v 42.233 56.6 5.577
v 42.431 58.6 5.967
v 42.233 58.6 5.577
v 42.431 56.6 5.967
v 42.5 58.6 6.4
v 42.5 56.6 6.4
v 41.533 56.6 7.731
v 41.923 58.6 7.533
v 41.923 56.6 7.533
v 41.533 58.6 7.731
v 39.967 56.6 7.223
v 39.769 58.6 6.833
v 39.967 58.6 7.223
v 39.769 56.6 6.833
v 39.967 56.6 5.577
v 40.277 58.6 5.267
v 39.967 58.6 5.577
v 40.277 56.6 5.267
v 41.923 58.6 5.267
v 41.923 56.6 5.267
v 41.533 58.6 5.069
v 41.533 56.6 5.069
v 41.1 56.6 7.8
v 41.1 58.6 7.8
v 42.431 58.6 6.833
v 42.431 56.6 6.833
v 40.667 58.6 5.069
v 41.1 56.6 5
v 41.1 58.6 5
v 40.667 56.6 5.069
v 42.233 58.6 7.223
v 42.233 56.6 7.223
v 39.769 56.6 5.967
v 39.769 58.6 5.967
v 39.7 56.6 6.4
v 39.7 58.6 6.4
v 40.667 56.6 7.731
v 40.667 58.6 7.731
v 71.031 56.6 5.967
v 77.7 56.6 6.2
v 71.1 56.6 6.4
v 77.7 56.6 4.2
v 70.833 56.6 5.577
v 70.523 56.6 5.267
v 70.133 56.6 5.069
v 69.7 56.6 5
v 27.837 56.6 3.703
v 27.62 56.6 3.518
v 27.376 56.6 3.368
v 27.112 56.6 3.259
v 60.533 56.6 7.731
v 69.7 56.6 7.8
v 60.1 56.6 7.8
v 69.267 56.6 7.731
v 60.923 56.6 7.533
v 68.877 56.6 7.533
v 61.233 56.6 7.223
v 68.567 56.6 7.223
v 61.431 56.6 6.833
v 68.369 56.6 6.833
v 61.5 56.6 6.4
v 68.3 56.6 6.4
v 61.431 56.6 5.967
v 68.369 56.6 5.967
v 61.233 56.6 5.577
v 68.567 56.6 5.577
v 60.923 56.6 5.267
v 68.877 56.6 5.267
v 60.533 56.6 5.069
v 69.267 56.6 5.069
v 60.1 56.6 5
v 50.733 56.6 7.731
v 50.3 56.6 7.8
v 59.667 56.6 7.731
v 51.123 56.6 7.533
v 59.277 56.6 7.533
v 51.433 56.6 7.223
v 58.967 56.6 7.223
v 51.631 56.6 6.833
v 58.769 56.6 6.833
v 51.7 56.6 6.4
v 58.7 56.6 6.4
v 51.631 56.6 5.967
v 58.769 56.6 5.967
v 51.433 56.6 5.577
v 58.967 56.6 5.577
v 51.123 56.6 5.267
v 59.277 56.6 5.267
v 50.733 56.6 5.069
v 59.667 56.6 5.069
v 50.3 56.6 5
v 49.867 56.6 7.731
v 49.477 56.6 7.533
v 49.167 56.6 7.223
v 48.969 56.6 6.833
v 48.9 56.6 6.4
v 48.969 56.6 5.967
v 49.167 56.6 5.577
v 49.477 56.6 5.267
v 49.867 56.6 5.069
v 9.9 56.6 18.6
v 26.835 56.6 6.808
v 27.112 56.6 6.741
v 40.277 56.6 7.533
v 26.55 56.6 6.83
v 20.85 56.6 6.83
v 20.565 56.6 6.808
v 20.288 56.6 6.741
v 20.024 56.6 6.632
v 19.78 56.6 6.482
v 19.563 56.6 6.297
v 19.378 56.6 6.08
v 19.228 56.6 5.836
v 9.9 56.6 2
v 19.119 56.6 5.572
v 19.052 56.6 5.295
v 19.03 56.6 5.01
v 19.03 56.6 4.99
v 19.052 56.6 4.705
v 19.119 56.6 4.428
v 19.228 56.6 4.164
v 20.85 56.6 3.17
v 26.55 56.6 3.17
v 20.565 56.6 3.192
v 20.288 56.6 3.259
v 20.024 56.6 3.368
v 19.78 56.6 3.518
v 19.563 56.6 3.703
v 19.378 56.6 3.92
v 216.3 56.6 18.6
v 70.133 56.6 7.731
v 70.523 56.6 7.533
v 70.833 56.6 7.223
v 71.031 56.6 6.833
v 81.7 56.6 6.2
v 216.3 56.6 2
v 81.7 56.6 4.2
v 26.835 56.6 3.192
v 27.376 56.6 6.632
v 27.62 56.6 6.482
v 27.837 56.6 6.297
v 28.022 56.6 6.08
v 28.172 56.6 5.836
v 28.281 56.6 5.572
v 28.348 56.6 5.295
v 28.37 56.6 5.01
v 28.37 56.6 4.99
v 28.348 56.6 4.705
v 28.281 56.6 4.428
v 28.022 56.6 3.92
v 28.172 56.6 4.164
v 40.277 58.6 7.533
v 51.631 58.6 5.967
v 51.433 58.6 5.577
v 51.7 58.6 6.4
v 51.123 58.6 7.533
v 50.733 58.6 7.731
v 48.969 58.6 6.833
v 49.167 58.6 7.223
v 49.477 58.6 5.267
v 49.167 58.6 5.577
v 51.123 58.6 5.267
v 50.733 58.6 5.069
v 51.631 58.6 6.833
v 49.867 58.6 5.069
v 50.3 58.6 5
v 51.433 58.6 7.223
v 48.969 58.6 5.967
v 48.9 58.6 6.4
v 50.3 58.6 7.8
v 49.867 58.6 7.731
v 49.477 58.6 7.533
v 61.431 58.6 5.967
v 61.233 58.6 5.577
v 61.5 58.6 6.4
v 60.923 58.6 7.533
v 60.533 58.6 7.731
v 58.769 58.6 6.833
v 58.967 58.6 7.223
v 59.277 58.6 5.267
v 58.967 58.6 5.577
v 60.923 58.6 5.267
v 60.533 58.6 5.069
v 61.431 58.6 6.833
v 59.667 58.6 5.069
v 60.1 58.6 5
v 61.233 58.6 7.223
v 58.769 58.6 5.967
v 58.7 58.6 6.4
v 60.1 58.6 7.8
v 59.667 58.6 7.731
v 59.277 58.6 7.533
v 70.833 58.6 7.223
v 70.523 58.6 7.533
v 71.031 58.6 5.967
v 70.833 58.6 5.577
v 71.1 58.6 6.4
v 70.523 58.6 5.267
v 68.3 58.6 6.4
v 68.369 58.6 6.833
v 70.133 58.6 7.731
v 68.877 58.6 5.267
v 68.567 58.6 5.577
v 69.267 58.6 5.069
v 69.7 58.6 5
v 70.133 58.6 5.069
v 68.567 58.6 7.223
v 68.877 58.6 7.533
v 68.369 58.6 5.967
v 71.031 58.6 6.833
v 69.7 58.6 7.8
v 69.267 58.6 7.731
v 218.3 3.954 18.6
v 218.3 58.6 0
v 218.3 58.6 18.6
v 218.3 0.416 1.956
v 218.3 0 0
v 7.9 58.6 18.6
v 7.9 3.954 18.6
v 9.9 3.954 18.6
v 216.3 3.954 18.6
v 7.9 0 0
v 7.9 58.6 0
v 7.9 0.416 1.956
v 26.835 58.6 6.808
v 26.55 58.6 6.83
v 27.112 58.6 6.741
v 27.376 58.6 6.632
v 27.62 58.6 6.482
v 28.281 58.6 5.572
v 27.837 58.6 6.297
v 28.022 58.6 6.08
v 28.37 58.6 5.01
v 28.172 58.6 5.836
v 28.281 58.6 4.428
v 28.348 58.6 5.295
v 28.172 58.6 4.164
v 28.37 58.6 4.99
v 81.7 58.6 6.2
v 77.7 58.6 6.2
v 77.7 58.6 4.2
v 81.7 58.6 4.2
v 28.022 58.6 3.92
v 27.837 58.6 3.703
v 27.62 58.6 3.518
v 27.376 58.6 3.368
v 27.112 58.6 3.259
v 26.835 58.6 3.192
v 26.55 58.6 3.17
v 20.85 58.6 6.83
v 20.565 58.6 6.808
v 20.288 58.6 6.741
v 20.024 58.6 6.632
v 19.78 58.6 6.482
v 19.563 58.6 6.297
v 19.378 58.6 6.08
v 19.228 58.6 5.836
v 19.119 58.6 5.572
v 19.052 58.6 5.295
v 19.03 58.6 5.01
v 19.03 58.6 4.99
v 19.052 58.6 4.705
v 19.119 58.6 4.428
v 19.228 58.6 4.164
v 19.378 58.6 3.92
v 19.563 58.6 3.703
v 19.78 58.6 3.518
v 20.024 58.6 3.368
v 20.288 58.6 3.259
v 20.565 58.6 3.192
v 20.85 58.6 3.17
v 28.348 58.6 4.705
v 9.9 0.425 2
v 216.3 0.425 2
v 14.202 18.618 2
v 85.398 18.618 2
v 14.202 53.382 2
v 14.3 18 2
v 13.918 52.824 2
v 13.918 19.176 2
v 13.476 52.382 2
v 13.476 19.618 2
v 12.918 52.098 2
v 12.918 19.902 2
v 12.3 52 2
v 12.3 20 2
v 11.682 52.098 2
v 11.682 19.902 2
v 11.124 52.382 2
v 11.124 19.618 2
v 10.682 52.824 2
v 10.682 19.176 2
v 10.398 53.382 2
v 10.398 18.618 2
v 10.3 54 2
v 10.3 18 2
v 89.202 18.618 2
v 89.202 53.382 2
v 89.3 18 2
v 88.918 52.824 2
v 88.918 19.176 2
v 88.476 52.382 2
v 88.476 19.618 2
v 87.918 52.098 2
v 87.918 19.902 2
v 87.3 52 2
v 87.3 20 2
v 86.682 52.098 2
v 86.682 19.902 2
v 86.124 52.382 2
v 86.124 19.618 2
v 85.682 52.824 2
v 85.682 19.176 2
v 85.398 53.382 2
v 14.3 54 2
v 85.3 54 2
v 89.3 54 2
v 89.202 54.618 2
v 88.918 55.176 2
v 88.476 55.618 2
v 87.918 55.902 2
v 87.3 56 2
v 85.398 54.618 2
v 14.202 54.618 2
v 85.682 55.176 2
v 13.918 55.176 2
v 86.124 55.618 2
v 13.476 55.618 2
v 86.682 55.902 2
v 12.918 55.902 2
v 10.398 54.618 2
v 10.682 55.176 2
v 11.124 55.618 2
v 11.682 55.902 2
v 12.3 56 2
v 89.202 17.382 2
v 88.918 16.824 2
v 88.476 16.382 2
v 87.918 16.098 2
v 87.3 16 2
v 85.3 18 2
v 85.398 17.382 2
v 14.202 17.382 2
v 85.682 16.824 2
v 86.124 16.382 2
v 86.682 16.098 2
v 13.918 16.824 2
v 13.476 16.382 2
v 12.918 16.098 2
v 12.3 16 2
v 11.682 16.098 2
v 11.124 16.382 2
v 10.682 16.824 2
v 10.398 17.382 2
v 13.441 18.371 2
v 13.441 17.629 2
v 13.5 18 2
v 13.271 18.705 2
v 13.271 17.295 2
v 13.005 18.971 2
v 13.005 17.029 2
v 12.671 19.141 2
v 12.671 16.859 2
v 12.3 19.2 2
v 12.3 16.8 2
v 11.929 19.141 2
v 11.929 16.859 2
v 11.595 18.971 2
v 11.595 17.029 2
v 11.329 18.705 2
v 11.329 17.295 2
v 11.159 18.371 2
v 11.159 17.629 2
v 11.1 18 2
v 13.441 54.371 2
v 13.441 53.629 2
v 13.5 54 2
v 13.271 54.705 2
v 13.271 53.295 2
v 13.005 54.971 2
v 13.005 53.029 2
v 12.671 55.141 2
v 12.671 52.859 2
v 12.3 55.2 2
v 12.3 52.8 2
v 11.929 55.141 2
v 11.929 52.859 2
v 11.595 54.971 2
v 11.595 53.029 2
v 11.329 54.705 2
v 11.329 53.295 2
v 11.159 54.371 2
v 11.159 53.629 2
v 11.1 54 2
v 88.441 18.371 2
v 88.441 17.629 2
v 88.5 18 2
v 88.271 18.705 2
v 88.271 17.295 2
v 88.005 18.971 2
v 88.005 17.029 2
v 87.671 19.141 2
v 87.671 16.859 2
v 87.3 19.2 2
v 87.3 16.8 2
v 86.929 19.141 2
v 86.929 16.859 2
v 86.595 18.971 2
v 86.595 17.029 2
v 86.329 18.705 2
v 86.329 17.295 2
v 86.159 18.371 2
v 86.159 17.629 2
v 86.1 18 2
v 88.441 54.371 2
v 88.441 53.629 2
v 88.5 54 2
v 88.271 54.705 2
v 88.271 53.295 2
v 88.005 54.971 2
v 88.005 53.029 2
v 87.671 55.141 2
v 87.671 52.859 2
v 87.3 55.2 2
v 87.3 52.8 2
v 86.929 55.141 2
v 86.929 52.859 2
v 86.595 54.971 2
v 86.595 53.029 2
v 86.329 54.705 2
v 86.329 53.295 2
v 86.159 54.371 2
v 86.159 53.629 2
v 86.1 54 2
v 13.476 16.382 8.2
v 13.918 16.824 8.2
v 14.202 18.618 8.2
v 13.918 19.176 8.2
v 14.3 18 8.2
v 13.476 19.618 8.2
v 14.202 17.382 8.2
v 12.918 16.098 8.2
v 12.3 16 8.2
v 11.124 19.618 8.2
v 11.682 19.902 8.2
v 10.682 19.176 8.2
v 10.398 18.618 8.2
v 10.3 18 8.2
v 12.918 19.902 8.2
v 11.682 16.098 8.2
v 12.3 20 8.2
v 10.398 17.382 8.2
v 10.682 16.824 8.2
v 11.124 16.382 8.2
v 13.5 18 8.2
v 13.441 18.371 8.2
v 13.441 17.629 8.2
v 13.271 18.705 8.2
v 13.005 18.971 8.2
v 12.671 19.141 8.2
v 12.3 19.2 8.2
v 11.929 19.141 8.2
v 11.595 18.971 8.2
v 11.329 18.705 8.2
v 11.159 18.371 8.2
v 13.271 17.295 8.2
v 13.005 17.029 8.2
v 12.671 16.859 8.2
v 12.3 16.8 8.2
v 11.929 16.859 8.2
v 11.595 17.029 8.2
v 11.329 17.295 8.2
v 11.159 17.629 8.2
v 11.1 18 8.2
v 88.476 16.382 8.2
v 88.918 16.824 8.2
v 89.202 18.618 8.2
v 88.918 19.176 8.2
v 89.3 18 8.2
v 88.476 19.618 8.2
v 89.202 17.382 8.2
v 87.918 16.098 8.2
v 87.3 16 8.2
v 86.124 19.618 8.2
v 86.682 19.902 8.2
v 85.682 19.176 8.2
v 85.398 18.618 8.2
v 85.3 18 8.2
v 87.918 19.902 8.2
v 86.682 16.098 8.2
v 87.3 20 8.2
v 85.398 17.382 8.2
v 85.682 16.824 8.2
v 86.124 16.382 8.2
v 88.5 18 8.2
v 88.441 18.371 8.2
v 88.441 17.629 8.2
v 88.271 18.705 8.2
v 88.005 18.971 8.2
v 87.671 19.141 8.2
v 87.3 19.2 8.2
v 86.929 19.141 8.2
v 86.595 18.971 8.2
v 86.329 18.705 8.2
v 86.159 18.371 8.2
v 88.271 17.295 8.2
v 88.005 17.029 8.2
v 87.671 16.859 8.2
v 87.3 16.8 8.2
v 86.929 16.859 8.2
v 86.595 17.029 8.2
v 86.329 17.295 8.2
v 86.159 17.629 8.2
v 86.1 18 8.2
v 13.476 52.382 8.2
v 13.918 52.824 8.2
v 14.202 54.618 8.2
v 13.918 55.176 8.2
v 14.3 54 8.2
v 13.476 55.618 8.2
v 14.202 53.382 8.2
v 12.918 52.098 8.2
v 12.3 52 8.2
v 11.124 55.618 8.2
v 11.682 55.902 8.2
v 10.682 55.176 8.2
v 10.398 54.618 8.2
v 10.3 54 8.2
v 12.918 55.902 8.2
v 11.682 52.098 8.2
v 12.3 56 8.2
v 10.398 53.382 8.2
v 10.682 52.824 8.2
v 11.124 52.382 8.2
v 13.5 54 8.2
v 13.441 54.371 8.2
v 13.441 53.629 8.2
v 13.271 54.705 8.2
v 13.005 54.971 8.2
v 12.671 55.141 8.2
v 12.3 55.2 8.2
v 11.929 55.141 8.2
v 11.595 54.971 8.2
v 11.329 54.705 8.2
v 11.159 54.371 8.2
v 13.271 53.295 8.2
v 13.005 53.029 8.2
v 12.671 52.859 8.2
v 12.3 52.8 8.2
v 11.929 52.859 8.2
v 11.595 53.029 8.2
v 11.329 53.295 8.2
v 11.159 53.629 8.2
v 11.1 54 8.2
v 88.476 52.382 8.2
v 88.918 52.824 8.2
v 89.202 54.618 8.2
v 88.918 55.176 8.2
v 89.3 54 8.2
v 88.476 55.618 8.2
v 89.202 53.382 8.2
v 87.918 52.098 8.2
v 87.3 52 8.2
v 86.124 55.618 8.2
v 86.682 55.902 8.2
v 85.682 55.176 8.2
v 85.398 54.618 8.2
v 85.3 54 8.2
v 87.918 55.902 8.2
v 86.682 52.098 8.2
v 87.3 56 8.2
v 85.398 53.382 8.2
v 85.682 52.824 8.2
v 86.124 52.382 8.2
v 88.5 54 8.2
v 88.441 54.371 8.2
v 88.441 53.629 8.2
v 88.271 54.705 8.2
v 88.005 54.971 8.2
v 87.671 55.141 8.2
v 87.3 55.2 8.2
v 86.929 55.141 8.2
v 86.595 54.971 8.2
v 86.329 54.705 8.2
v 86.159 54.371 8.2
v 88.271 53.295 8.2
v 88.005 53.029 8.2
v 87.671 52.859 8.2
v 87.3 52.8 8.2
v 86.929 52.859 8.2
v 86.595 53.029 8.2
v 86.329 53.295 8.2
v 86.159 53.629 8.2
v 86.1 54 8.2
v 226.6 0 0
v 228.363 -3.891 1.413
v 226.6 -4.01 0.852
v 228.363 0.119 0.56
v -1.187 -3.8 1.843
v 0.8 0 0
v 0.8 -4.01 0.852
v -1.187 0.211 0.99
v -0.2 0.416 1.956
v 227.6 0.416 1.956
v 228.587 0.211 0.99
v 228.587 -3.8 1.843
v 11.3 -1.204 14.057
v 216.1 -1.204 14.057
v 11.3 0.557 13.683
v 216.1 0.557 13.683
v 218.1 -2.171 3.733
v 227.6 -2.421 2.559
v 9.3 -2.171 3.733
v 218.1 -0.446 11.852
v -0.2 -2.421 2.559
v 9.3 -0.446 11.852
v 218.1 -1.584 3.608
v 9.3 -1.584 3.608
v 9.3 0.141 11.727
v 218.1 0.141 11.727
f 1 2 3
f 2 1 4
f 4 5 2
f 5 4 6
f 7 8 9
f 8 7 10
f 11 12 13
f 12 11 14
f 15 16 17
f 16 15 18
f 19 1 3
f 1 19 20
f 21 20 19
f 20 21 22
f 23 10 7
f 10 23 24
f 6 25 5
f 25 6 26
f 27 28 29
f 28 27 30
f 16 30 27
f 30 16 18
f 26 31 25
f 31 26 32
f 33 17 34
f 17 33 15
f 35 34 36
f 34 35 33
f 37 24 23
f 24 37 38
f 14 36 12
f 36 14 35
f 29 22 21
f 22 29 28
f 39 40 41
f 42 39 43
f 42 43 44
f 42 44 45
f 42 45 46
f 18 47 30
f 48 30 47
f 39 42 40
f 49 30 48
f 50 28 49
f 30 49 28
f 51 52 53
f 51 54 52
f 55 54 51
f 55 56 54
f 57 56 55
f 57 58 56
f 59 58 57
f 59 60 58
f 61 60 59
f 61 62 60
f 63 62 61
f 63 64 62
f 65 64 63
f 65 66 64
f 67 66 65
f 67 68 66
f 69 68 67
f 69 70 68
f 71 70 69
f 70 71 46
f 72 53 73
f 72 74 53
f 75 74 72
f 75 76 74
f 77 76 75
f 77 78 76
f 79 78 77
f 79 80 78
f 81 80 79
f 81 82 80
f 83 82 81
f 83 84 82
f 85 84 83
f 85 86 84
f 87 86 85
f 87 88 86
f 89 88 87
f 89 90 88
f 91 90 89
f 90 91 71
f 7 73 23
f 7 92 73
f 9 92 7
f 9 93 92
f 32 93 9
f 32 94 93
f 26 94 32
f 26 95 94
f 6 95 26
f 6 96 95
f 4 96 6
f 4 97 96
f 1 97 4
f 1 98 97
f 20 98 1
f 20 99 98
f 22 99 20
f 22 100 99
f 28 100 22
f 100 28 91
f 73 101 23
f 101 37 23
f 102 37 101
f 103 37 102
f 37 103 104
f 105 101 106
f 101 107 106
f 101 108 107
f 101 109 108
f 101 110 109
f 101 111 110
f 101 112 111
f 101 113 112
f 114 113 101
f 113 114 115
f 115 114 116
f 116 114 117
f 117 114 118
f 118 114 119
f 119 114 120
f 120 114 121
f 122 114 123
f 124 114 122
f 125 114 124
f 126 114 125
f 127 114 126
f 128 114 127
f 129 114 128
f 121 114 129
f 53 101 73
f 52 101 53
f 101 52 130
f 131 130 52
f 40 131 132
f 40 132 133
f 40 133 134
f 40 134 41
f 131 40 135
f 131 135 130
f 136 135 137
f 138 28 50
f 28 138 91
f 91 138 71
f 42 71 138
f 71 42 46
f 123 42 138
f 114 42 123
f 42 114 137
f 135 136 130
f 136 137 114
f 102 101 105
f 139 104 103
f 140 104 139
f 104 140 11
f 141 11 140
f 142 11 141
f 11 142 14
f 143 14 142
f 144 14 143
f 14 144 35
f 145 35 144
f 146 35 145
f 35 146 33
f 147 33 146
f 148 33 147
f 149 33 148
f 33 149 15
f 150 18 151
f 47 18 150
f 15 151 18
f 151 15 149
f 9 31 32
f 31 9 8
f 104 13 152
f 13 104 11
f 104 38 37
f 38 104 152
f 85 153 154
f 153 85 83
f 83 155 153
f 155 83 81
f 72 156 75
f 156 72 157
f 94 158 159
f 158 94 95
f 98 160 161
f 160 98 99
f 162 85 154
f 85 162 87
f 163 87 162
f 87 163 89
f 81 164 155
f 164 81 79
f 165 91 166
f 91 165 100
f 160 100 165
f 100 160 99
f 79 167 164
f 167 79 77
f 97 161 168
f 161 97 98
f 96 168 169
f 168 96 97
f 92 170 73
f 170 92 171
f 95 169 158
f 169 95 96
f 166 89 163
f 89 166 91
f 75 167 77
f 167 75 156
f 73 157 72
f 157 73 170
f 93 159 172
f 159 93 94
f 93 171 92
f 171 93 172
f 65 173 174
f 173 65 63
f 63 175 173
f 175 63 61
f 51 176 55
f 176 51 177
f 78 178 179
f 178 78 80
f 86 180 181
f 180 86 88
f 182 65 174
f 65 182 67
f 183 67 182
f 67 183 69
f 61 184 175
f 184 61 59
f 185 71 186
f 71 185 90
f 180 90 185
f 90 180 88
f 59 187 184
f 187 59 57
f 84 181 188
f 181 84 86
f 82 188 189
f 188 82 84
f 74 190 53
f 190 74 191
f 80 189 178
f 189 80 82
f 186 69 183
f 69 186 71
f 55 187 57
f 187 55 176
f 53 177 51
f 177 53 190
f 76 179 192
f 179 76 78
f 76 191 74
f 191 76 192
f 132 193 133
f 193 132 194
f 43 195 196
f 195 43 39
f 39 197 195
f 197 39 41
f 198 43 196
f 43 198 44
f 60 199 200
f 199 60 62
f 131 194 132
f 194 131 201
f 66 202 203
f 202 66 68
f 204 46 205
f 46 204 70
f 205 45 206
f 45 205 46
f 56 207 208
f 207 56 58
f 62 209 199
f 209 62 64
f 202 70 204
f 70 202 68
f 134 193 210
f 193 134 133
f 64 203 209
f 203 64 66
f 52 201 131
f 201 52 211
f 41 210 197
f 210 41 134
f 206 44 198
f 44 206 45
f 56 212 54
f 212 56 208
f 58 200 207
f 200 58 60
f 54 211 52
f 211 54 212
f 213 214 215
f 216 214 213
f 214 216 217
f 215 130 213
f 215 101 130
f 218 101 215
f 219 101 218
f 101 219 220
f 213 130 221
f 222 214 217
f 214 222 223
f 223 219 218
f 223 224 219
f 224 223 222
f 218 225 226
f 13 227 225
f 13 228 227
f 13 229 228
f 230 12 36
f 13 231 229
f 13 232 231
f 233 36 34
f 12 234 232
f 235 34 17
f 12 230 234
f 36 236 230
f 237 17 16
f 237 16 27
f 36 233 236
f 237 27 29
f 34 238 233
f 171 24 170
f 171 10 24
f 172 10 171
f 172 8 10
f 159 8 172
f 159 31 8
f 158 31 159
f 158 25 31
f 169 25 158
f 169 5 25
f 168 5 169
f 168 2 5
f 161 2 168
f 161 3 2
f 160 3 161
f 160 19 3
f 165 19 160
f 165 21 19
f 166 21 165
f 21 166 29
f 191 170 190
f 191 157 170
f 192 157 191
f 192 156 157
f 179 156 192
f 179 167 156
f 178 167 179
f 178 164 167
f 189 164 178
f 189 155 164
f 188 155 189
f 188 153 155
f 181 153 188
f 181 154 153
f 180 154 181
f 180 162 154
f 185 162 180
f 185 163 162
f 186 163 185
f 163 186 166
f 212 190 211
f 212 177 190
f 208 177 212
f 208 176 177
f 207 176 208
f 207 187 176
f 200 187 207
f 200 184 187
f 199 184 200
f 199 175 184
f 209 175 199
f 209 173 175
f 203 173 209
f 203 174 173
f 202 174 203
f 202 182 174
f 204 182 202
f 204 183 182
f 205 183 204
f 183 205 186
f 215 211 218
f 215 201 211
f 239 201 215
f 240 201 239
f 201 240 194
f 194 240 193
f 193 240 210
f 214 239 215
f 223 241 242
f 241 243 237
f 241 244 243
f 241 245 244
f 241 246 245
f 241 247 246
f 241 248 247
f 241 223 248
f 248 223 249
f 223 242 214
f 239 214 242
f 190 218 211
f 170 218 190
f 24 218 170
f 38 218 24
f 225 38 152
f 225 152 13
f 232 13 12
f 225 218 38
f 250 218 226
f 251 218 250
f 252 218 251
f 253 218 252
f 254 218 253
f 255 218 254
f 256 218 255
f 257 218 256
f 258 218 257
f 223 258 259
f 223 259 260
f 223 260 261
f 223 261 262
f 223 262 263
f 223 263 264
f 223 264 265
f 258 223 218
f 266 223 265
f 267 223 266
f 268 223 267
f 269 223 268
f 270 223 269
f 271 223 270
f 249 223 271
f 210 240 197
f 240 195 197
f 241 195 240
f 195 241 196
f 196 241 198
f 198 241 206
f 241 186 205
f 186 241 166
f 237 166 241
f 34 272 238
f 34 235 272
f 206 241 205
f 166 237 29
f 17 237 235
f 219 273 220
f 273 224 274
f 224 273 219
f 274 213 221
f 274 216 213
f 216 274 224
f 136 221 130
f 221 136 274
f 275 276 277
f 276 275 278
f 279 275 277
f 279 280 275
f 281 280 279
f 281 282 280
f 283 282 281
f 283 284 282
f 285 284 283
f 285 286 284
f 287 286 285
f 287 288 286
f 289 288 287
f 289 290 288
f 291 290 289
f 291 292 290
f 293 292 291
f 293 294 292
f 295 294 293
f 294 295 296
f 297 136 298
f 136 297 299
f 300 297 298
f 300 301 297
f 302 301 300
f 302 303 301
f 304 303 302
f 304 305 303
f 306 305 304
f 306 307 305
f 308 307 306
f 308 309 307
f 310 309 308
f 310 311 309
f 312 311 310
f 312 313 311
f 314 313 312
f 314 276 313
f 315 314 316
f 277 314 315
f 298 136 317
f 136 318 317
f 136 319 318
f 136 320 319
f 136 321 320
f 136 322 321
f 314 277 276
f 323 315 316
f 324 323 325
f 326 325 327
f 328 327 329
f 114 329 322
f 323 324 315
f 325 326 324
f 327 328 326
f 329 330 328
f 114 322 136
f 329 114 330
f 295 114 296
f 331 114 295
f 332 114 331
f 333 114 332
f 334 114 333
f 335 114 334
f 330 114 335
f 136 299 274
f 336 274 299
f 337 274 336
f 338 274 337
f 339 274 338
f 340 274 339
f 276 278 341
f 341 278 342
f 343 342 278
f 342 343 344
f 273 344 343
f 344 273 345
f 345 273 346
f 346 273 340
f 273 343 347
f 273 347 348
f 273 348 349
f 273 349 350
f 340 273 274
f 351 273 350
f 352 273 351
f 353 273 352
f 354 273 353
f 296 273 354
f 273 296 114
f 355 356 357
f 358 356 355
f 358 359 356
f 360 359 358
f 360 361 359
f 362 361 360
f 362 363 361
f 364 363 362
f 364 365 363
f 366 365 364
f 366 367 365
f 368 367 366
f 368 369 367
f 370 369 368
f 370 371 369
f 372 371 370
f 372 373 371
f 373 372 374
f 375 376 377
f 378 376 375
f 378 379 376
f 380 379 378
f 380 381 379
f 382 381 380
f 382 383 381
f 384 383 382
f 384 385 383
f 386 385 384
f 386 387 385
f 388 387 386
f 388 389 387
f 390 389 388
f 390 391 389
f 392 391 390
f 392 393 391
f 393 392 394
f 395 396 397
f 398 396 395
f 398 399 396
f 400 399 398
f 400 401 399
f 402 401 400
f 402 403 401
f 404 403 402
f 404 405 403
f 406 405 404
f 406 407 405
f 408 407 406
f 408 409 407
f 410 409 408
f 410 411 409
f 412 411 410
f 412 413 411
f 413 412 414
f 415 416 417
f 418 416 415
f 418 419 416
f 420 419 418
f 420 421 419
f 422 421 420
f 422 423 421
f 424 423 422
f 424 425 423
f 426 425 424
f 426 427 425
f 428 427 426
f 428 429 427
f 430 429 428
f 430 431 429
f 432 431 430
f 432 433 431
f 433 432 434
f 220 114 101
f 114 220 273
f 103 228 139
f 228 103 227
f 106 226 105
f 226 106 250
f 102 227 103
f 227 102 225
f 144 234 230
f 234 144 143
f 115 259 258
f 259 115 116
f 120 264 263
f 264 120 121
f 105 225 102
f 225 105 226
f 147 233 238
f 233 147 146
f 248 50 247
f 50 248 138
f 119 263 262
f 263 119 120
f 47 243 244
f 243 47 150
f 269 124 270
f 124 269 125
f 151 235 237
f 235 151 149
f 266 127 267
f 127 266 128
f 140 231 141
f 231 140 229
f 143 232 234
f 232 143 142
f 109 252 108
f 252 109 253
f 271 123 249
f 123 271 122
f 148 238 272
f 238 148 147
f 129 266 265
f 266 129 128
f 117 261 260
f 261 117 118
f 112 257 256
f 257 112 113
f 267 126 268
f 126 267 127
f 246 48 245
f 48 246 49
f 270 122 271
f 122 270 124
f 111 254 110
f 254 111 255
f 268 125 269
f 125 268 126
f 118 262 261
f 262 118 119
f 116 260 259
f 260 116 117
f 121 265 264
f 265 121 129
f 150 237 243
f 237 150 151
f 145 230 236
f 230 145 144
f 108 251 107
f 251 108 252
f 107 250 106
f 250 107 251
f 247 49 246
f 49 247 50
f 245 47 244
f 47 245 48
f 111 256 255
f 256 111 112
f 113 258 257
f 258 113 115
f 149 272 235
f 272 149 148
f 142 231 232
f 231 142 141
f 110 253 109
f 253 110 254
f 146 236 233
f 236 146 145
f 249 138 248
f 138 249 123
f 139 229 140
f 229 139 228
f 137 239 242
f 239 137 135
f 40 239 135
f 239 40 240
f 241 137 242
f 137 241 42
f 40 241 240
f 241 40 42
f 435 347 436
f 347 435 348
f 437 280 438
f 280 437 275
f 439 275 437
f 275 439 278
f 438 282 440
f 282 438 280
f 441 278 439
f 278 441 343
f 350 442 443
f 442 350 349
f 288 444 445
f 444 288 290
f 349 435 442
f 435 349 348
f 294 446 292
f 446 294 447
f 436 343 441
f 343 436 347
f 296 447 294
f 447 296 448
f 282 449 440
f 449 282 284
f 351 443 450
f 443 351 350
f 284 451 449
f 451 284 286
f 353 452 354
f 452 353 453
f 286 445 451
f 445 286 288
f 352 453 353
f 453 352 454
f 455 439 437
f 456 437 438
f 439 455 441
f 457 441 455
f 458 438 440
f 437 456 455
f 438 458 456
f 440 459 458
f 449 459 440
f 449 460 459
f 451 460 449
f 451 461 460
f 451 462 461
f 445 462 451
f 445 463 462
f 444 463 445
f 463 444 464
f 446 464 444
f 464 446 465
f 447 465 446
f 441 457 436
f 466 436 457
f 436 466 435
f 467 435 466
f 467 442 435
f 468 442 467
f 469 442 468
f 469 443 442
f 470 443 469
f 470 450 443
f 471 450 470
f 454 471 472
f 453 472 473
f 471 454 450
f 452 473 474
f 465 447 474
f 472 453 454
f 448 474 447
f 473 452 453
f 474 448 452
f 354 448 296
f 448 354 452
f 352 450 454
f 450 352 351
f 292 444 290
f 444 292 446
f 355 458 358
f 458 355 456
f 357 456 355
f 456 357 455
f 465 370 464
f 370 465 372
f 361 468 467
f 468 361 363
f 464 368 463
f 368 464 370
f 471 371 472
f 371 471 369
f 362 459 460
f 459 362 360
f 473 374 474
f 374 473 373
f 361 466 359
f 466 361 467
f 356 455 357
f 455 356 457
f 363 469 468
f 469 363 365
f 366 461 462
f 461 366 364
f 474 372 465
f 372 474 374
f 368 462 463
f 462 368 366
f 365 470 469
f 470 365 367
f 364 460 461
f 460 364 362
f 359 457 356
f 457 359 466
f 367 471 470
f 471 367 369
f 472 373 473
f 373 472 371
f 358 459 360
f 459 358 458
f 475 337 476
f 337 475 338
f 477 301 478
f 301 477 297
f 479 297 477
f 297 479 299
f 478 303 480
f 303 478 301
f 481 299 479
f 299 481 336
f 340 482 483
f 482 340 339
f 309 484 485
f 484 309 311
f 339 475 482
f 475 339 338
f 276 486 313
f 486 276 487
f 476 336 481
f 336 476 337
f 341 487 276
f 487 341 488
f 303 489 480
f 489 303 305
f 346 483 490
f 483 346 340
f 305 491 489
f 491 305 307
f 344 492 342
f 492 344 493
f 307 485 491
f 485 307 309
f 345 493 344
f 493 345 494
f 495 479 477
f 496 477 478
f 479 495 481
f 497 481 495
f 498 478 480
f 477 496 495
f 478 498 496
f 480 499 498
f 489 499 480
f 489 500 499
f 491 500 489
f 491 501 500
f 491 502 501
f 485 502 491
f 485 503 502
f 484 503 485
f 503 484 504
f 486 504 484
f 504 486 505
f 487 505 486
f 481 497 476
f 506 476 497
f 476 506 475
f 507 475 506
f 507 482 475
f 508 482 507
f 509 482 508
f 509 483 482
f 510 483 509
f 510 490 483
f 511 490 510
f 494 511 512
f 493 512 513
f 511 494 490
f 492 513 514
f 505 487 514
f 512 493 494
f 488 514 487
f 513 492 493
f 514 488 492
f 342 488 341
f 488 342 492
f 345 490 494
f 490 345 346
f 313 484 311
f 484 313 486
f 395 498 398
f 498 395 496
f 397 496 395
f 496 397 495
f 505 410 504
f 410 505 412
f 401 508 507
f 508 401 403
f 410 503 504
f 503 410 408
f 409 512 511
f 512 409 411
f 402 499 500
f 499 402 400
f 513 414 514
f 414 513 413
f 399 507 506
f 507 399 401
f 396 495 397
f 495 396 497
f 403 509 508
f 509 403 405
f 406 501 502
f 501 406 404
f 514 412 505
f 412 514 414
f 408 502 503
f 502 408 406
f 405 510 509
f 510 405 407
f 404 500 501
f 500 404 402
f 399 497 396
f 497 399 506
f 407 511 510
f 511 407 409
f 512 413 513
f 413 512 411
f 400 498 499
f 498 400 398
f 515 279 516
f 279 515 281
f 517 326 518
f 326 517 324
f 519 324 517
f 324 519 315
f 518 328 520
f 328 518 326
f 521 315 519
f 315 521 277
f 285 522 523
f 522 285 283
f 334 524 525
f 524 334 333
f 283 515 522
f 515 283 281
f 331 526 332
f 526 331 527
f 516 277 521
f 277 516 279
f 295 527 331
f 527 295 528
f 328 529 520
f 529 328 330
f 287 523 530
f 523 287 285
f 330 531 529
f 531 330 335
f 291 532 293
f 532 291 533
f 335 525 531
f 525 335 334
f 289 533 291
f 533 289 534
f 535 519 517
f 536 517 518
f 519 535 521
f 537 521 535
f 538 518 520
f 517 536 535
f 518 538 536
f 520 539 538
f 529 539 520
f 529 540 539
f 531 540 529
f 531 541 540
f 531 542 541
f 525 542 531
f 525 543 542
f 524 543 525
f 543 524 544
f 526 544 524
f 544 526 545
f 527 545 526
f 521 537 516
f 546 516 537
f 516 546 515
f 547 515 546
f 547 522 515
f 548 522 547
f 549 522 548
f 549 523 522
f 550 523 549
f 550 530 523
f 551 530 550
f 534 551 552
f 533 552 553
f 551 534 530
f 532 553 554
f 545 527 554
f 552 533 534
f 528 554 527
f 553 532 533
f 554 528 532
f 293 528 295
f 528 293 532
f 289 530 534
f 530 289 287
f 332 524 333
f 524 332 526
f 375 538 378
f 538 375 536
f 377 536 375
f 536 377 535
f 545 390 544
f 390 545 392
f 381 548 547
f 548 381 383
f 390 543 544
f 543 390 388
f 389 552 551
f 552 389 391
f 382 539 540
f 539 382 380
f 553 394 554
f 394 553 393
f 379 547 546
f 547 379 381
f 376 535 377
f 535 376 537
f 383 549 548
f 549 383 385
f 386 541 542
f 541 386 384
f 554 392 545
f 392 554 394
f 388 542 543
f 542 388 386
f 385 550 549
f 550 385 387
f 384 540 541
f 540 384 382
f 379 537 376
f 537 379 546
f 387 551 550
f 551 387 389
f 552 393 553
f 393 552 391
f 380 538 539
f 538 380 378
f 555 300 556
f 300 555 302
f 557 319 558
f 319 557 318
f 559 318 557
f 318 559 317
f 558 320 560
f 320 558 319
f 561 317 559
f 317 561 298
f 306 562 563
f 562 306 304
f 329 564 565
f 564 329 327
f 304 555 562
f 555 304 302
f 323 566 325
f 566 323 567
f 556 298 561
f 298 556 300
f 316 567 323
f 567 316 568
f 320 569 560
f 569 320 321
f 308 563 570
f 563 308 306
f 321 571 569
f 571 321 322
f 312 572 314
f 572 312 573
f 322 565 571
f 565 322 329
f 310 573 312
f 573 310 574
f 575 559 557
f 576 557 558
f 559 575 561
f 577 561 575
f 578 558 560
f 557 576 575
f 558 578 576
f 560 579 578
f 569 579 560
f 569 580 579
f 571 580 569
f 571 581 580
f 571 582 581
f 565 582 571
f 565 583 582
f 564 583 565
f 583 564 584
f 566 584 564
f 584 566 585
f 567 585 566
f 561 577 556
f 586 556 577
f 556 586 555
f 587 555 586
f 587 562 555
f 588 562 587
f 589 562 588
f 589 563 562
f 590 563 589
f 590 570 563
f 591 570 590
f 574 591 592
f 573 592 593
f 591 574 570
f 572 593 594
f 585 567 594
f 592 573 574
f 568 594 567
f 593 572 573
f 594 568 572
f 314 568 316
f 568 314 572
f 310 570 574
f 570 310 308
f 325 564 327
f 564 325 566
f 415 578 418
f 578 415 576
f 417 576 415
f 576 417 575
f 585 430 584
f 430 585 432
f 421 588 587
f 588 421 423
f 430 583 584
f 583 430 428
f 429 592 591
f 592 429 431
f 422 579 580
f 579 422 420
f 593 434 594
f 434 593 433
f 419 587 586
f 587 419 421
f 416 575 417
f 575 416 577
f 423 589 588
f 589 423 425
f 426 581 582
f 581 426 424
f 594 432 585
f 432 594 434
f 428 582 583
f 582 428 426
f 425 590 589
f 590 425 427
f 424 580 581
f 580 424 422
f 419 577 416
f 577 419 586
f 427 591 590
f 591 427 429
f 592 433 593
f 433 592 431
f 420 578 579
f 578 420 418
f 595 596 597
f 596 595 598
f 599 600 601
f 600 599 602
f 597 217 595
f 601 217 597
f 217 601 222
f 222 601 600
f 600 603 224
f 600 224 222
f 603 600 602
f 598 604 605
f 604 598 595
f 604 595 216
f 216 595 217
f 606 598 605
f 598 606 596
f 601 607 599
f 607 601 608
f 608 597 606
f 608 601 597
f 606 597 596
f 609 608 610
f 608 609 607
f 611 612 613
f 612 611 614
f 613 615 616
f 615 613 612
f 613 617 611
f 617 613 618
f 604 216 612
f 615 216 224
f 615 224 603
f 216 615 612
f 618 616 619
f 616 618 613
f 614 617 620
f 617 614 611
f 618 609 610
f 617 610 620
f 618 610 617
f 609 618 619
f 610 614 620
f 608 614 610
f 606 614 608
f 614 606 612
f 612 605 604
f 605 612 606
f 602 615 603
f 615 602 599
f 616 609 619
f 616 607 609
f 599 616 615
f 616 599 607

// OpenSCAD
// file: bezel_bottom.scad
// ============================================================
// Front Bezel - Bottom Side (mitered 45° corners)
// Bottom has large lip (10.3mm) over the display's 11.3mm
// inactive area, with narrow channel (1.2mm) for thin rim.
// Side channels at corners remain open for left/right rims.
// ============================================================
include <common.scad>

module bezel_bottom() {
    bezel_side("bottom");
}

bezel_bottom();
// file: base_stand.scad
// ============================================================
// Base / Stand - Open-front box with angled cut
//
// Board is flipped (FPC bends backward), back edge faces back wall:
//   LEFT → [USB-C] [btn1] [btn2] [btn3] [reset] [off/on] → RIGHT
//
// Component heights from board surface (standoff top):
//   USB-C: 3.2mm,  Buttons: 1.8mm,  Switch: 3.0mm
// ============================================================
include <common.scad>

module base_stand() {
    compartment_h = max(board_clearance + board_d, battery_d) + 5;
    base_h = base_wall + compartment_h;

    // Left wall wider to accommodate board 1mm offset from display
    left_ext = board_offset_x + tol;
    base_w = cavity_w + left_ext;

    // Board position in base coords
    board_x = base_wall;
    // Y: front hole center at 18mm from base front edge (y=0)
    // Front hole is at board_hole_edge_y from board front edge
    board_y = 18 - board_hole_edge_y;

    standoff_h = 6.2;   // tallest component ~5.8mm + 0.4mm clearance
    standoff_r = board_hole_dia / 2 + 0.8;
    screw_hole_r = board_hole_dia / 2;
    e = 0.01;

    // Component X positions from board left edge
    // (board is flipped, measured from left hole center)
    left_hole_from_edge = board_hole_edge_x;  // 2.4mm
    usb_x   = left_hole_from_edge + 11.4;     // 13.8mm
    btn1_x  = usb_x + 17.4;                   // 31.2mm
    btn2_x  = btn1_x + 9.2;                   // 40.4mm
    btn3_x  = btn2_x + 9.8;                   // 50.2mm
    reset_x = btn3_x + 9.6;                   // 59.8mm
    sw_off_x = reset_x + 9;                   // 68.8mm
    sw_on_x  = reset_x + 11;                  // 70.8mm
    sw_center_x = (sw_off_x + sw_on_x) / 2;  // 69.8mm

    // Component Z positions: board is upside down, components hang BELOW standoff top
    // Standoff top = board component-side surface
    board_surface_z = base_wall + standoff_h;
    usb_z    = board_surface_z - 3.2;    // USB-C center: 3.2mm below board surface
    btn_z    = board_surface_z - 1.8;    // button center: 1.8mm below board surface
    switch_z = board_surface_z - 3.0;    // switch center: 3.0mm below board surface

    // USB-C port (rounded rectangle / stadium shape)
    usb_port_w = 8.94 + 0.4;   // standard + clearance
    usb_port_h = 3.26 + 0.4;   // standard + clearance
    usb_port_r = usb_port_h / 2 - 0.01; // nearly fully rounded (avoid zero-height collapse)

    // Switch: 1.6mm square dial that slides between off and on positions
    sw_dial = 1.6 + 0.4;   // dial size + clearance
    sw_travel = sw_on_x - sw_off_x;  // 2.2mm travel distance
    sw_slot_w = sw_travel + sw_dial;  // slot width = travel + dial
    sw_slot_h = sw_dial;              // slot height = dial size

    difference() {
        cube([base_w, stand_foot_depth, base_h]);

        // 1. Angled cut at front
        translate([left_ext, 0, 0])
            rotate([-stand_angle, 0, 0])
                translate([-left_ext - e, -stand_foot_depth, -base_h])
                    cube([base_w + 2 * e, stand_foot_depth, base_h * 3]);

        // 2. Hollow interior (open front and top)
        translate([base_wall, -e, base_wall])
            cube([
                base_w - 2 * base_wall,
                stand_foot_depth - base_wall + e,
                compartment_h + e
            ]);

        // 3. USB-C port (back wall, rounded rectangle)
        translate([board_x + usb_x, stand_foot_depth - base_wall, usb_z])
            rotate([-90, 0, 0])
                linear_extrude(base_wall + e)
                    offset(r = usb_port_r, $fn = 40)
                        offset(r = -usb_port_r)
                            square([usb_port_w, usb_port_h], center = true);

        // 4. Button holes (back wall) - btn1, btn2, btn3, reset
        // Actual buttons are 2.4mm round + clearance
        btn_hole_d = 2.4 + 0.4;
        button_xs = [btn1_x, btn2_x, btn3_x, reset_x];
        for (bx = button_xs) {
            translate([board_x + bx, stand_foot_depth - base_wall, btn_z])
                rotate([-90, 0, 0])
                    cylinder(d = btn_hole_d, h = base_wall + e, $fn = 20);
        }

        // 5. On/off switch slot (back wall)
        translate([board_x + sw_center_x - sw_slot_w / 2,
                   stand_foot_depth - base_wall,
                   switch_z - sw_slot_h / 2])
            cube([sw_slot_w, base_wall + e, sw_slot_h]);
    }

    // Board standoffs at exact hole positions
    hole_positions = [
        [board_hole_edge_x, board_hole_edge_y],
        [board_hole_edge_x + board_hole_h, board_hole_edge_y],
        [board_hole_edge_x, board_hole_edge_y + board_hole_v],
        [board_hole_edge_x + board_hole_h, board_hole_edge_y + board_hole_v]
    ];

    for (pos = hole_positions) {
        translate([board_x + pos[0], board_y + pos[1], base_wall])
            difference() {
                cylinder(r = standoff_r, h = standoff_h, $fn = 20);
                cylinder(r = screw_hole_r, h = standoff_h + e, $fn = 20);
            }
    }
}

base_stand();
// main file
// ============================================================
// Assembly view: base + bottom bezel + ghost back panel
// All in desk coordinates: X=width, Y=depth, Z=height
// Panel (panel_w) is the reference at X=0
// ============================================================
include <common.scad>
use <base_stand.scad>
use <bezel_bottom.scad>

_slot_w = frame_d + wall_thick;
_left_ext = board_offset_x + tol;  // base is wider on left by this amount

// Base centered under panel (accounting for asymmetric left extension)
// Cavity in base starts at _left_ext from base left edge
// Panel cavity starts at panel_rim from panel left edge
// So base left edge = panel_rim - _left_ext
color("DimGray")
    translate([panel_rim - _left_ext, 0, 0])
        base_stand();

// Bottom bezel (frame_w wide) centered on panel
// X offset: -(frame_w - panel_w) / 2 = -panel_inset
color("Gold")
    translate([-panel_inset, 0, 0])
        rotate([90 - stand_angle, 0, 0])
            bezel_bottom();
